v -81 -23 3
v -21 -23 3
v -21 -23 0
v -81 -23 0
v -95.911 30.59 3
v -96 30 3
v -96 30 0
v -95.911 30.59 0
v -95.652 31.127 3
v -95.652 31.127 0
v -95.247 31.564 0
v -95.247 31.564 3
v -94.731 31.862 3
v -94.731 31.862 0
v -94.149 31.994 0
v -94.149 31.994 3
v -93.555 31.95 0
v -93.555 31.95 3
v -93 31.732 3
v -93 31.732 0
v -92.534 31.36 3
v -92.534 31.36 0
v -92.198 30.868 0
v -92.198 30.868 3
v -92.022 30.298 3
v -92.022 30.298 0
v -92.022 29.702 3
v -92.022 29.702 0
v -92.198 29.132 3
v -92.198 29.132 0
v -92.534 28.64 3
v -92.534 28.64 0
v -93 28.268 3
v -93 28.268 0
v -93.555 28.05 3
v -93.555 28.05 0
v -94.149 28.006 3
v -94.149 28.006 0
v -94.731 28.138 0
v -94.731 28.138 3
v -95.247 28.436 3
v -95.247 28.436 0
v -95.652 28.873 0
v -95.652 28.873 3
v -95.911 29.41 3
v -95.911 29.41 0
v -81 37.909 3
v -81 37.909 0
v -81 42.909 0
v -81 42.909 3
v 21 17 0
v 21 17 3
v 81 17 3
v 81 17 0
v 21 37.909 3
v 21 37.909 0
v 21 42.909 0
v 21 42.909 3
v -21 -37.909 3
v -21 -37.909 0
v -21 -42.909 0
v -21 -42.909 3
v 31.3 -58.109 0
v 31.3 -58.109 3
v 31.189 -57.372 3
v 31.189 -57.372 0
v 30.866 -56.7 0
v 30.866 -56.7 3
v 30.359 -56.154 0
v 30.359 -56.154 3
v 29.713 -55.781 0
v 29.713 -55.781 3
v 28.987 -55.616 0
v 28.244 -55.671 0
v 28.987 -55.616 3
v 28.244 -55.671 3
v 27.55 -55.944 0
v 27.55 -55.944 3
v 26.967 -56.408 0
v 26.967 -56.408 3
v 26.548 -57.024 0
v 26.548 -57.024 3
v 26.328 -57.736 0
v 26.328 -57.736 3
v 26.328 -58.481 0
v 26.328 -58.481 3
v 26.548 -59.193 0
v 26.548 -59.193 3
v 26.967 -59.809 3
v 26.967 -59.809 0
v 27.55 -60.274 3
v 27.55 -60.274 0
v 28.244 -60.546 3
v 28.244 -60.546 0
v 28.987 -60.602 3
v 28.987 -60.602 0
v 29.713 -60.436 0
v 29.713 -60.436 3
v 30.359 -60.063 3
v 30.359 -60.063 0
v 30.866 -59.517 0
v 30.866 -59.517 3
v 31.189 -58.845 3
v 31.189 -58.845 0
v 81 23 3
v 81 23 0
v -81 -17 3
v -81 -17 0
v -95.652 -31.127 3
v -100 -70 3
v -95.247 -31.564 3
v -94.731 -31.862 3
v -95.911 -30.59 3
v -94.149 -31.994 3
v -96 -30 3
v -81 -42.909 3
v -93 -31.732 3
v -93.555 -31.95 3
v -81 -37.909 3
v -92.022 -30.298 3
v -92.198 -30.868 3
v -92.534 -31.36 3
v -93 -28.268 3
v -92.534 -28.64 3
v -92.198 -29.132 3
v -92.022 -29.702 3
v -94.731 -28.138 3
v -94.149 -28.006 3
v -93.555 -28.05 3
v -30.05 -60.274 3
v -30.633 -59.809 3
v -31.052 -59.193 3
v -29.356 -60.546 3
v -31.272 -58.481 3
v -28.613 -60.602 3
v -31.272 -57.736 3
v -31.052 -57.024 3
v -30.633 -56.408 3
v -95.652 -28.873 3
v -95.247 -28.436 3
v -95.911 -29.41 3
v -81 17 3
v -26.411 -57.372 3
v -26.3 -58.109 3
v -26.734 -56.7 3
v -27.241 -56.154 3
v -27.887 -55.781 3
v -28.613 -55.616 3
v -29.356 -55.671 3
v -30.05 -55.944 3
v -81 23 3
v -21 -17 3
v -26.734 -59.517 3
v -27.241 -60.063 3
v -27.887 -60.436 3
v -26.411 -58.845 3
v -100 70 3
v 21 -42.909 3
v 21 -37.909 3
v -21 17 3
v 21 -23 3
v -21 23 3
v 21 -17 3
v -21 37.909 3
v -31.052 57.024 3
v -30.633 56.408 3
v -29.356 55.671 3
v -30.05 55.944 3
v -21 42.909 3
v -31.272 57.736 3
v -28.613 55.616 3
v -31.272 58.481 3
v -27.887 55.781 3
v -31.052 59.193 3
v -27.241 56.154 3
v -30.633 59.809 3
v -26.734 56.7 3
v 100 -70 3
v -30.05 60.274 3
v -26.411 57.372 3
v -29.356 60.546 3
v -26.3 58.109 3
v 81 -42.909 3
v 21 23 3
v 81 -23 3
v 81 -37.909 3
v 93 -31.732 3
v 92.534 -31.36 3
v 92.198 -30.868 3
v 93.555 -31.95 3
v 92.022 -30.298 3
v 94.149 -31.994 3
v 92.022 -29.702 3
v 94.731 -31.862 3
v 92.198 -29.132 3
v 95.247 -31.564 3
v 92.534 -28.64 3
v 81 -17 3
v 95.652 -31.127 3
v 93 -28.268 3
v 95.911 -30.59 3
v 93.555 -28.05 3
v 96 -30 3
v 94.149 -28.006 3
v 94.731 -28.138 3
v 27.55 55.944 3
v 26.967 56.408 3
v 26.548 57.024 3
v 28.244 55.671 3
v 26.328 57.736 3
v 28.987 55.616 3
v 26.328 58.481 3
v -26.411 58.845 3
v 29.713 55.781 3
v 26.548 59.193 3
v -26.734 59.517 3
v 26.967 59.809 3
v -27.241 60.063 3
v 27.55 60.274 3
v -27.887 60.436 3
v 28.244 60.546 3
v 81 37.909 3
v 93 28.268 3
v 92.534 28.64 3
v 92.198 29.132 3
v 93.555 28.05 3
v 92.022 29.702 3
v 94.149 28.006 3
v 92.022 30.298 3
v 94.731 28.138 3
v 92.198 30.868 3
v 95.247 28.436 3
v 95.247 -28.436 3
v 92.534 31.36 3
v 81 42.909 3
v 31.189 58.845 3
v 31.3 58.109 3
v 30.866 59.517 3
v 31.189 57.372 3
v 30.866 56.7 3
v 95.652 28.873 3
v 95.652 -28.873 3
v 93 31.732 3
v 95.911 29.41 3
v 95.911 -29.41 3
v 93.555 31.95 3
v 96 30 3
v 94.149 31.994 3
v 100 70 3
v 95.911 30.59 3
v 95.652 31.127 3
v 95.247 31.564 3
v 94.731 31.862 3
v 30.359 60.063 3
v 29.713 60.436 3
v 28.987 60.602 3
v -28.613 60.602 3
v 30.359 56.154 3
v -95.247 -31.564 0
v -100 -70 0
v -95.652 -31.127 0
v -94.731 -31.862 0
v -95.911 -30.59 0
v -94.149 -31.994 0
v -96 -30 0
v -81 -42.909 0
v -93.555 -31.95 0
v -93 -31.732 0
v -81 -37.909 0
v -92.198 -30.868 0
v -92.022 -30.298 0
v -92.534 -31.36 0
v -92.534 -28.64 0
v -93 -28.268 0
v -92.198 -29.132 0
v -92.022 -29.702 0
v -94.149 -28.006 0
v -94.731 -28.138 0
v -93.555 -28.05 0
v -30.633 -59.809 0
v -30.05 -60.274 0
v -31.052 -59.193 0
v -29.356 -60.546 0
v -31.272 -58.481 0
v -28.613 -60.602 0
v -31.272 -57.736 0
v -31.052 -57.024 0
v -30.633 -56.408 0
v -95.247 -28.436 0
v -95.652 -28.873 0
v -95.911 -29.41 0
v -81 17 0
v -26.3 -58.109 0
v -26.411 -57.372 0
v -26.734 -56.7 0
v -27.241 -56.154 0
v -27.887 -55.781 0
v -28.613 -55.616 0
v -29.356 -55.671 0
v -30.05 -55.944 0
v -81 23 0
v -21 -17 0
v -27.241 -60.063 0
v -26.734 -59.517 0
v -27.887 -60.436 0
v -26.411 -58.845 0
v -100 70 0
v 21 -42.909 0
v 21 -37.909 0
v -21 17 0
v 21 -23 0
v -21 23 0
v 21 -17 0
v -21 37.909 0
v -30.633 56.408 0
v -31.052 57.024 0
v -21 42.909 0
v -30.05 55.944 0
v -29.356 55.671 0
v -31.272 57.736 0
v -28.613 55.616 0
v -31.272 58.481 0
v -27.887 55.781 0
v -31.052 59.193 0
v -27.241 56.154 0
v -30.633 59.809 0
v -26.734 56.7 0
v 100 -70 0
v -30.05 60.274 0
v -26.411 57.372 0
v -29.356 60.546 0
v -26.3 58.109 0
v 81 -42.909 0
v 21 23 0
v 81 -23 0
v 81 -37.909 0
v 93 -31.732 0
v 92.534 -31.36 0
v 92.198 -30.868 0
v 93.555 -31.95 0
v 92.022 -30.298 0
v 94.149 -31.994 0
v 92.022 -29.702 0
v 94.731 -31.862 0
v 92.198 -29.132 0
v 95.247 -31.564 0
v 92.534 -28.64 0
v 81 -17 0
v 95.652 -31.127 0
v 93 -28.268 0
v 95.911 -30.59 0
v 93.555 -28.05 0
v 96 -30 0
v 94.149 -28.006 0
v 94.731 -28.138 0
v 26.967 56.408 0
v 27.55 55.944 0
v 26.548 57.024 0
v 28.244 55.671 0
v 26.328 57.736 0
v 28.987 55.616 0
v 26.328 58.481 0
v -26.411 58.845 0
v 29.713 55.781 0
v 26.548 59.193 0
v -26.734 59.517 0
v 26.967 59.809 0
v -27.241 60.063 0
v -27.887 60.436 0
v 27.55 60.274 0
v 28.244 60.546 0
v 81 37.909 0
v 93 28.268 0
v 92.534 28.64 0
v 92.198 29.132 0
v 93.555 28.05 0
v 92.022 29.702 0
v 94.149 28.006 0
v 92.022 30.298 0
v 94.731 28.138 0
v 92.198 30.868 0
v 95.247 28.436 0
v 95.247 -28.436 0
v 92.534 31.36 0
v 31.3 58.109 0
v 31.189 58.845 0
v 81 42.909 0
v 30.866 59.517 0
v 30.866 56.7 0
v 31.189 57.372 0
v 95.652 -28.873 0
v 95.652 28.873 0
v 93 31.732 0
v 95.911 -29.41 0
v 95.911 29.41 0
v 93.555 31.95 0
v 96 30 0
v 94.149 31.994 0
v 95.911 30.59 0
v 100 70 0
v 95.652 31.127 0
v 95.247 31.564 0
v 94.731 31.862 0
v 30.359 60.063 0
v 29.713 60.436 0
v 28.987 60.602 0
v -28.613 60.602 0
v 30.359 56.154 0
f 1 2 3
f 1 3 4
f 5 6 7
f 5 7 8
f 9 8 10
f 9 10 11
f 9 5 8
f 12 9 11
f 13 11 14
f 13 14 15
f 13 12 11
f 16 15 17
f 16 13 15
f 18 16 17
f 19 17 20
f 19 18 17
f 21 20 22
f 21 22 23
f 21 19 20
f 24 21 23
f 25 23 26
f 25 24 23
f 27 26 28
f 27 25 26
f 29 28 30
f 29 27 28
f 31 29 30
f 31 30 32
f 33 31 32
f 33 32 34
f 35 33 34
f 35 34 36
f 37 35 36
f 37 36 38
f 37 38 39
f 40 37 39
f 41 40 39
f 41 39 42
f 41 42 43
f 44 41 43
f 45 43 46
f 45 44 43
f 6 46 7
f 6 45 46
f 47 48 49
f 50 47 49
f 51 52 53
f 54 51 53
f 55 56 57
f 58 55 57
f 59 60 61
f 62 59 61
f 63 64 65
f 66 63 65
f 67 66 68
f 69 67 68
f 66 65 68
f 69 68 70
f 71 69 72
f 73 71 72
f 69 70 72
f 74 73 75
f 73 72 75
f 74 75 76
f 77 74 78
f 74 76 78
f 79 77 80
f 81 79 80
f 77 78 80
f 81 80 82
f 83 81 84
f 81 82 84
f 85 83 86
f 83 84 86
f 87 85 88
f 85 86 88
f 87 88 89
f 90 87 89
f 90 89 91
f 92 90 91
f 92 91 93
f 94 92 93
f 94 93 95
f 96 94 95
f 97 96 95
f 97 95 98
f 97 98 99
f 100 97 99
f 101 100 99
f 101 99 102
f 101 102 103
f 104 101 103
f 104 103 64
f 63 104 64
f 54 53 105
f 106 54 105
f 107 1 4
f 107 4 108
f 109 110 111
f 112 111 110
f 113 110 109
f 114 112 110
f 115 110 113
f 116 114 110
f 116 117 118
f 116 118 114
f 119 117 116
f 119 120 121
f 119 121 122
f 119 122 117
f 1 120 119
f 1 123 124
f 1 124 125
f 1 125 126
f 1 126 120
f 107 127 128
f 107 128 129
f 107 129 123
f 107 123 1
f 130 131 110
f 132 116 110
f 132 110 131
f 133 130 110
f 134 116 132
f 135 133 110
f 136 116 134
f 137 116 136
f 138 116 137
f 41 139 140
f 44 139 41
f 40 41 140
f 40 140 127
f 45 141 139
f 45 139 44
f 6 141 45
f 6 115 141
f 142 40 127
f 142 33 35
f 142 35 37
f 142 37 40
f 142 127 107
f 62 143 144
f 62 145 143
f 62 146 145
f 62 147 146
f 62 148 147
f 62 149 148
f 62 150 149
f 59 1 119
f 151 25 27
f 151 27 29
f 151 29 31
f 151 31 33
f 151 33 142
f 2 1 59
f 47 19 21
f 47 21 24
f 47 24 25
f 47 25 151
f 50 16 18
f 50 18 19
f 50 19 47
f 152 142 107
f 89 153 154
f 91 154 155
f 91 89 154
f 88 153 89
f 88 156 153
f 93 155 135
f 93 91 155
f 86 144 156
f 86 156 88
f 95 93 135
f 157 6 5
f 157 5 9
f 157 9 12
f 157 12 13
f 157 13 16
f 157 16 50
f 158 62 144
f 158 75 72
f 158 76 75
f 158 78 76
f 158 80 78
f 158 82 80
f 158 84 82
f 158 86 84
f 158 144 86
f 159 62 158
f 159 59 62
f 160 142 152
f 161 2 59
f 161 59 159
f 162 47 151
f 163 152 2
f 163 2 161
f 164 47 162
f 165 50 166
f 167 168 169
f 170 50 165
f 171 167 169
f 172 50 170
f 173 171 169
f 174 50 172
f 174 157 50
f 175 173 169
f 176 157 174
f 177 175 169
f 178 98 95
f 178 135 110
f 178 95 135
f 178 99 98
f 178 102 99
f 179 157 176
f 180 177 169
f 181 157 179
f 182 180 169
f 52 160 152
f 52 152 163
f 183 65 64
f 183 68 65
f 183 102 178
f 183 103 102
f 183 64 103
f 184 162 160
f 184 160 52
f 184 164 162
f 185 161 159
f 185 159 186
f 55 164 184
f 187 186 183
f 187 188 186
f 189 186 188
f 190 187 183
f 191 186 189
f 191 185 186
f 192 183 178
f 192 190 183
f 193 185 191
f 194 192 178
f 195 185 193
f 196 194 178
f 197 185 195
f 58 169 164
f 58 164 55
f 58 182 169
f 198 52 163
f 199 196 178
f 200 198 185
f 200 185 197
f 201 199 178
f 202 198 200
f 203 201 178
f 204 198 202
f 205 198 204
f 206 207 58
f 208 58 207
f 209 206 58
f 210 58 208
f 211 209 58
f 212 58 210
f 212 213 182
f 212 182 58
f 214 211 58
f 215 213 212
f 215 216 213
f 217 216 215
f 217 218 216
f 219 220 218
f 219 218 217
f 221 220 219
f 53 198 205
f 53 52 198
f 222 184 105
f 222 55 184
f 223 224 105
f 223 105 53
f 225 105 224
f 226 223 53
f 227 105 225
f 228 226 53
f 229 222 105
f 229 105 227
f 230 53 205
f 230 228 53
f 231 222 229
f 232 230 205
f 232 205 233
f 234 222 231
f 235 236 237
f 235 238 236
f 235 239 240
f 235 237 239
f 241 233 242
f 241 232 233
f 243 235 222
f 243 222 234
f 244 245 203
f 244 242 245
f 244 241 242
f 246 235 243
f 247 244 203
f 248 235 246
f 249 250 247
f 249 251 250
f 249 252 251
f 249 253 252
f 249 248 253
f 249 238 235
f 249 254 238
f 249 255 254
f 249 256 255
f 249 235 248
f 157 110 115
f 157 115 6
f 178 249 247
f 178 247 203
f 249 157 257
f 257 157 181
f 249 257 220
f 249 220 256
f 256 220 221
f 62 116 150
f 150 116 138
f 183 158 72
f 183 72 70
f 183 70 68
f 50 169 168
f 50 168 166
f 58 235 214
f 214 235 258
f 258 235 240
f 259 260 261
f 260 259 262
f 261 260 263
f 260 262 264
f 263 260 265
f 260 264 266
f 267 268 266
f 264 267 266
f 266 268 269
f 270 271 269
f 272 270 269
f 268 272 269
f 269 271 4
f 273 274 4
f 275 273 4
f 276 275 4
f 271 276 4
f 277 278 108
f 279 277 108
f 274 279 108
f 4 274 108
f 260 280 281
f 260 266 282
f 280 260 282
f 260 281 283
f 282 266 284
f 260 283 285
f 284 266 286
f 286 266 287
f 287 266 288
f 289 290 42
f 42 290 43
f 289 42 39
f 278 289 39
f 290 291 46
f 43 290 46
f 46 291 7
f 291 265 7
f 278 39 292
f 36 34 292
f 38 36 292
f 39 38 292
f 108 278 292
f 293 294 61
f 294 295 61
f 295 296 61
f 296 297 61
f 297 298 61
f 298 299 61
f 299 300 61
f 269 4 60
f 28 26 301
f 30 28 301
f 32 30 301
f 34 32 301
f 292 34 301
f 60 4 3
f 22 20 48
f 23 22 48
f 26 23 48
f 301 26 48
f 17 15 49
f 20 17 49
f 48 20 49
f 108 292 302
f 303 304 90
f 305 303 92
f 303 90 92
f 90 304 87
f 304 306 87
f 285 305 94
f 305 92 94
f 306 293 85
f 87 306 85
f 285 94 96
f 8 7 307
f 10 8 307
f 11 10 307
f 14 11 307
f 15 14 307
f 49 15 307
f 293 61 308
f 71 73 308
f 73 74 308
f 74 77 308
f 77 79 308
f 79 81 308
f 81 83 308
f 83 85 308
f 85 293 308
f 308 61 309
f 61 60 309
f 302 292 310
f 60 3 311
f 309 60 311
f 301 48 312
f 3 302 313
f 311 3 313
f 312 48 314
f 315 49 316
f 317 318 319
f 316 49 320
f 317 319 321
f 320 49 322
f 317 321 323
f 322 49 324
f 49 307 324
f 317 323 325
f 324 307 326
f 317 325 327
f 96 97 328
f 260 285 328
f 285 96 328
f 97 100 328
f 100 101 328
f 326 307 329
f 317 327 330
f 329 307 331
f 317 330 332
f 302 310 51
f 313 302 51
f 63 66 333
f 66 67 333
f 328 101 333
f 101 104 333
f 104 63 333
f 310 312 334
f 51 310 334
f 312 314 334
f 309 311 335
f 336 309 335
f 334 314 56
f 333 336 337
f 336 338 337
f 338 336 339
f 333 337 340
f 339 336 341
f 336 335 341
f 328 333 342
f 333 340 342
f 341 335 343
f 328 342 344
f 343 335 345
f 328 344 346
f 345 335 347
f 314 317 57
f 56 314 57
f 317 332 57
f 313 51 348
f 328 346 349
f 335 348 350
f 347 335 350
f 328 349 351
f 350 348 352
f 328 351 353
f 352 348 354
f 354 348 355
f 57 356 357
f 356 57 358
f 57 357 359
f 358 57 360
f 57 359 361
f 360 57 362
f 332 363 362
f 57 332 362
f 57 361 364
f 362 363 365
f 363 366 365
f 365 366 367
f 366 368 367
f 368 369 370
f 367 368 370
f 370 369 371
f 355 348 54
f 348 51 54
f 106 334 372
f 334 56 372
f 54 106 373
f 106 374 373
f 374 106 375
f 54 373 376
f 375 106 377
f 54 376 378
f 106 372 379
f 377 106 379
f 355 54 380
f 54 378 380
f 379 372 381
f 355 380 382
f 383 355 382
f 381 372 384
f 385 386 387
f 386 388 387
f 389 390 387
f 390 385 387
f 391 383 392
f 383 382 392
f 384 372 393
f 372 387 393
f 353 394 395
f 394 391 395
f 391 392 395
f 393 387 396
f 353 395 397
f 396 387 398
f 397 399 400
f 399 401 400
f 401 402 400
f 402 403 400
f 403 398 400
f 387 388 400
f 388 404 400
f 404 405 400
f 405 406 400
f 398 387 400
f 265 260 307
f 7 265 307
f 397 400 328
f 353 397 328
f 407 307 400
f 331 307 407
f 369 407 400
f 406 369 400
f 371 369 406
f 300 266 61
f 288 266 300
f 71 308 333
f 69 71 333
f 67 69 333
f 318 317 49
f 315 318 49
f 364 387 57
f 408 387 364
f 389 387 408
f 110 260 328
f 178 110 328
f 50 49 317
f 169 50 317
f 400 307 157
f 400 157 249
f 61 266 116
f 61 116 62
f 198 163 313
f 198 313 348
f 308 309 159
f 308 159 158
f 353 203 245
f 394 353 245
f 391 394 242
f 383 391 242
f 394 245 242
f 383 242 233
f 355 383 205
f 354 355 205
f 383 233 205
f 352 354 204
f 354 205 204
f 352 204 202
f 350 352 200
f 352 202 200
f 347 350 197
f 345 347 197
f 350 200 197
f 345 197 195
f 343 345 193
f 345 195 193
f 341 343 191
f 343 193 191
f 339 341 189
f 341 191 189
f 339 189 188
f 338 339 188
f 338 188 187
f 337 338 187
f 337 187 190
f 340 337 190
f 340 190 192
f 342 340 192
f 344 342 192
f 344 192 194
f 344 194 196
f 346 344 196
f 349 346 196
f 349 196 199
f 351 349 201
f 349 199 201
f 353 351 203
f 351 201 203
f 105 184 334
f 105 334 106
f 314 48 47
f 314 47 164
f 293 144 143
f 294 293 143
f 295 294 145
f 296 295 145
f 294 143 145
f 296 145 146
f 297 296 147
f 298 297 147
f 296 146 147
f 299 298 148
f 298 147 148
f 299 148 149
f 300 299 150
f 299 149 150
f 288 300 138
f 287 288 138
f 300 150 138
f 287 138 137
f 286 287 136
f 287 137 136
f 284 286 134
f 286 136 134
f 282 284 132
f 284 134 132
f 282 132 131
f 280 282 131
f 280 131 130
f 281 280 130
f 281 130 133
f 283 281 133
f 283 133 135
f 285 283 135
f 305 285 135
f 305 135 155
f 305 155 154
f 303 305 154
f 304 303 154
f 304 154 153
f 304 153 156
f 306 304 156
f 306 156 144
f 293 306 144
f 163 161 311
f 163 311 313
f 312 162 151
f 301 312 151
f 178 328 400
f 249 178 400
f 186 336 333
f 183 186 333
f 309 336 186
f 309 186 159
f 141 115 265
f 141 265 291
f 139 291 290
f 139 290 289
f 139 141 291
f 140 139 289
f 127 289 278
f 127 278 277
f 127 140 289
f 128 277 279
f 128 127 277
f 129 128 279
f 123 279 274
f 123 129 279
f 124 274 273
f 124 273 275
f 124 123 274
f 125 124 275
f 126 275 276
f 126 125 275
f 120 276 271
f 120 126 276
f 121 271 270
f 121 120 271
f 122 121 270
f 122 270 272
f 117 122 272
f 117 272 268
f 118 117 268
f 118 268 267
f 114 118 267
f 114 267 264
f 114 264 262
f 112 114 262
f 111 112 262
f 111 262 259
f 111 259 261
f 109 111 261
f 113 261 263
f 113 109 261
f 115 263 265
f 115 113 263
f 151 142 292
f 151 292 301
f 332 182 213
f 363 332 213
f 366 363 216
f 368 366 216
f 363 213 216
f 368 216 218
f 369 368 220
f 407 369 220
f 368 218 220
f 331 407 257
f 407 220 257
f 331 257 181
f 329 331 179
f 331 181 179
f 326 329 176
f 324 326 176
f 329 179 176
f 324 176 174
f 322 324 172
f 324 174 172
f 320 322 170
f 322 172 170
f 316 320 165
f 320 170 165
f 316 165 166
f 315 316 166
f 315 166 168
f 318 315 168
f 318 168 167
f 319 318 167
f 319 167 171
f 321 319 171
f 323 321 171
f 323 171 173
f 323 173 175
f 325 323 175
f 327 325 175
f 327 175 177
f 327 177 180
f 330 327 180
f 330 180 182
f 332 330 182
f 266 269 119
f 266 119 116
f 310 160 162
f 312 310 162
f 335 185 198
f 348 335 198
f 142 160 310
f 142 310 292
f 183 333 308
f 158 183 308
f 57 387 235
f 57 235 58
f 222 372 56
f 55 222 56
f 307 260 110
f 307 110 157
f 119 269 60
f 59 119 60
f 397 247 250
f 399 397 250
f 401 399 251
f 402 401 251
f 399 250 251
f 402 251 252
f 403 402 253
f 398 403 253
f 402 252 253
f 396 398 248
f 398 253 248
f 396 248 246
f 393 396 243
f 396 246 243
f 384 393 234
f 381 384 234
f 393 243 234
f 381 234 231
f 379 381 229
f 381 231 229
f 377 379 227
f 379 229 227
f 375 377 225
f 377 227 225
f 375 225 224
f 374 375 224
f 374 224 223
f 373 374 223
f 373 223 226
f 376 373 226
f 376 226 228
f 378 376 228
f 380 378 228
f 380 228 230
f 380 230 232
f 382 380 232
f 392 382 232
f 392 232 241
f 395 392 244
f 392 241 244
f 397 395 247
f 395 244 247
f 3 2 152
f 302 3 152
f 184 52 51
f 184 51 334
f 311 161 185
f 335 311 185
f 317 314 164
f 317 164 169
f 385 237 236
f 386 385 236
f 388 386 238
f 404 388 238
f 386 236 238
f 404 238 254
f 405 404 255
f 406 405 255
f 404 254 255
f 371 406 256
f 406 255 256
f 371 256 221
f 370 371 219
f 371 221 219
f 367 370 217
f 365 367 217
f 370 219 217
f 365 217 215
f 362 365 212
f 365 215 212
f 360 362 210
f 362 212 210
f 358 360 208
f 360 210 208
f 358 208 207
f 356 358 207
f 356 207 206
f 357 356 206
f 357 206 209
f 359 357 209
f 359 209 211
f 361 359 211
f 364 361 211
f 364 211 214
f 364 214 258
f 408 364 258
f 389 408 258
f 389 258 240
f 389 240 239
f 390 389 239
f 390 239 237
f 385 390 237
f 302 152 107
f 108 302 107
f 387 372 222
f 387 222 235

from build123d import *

# Parameters (mm, degrees)
SKETCH_2_W               = 200
SKETCH_2_H               = 140
EXTRUDE_1_DEPTH          = 3
SKETCH_3_R               = 2
CUT_EXTRUDE_1_DEPTH      = 3
SKETCH_4_W               = 60
SKETCH_4_H               = 6
CUT_EXTRUDE_2_DEPTH      = 10
SKETCH_5_W               = 60
SKETCH_5_H               = 5
CUT_EXTRUDE_3_DEPTH      = 6
MIRROR_2_COPY_1_SKETCH_W = 60
MIRROR_2_COPY_1_SKETCH_H = 5
MIRROR_2_COPY_1_DEPTH    = 6
SKETCH_6_R               = 2.5
CUT_EXTRUDE_4_DEPTH      = 5


with BuildPart() as part:
    # 草图2 → 凸台-拉伸1 (new body)
    with BuildSketch(Plane.XY):
        Rectangle(SKETCH_2_W, SKETCH_2_H)
    extrude(amount=EXTRUDE_1_DEPTH)

    # 草图3 → 切除-拉伸1 (cut)
    with BuildSketch(Plane.XY.offset(3)):
        with Locations((94, 30)):
            Circle(SKETCH_3_R)
        with Locations((94, -30)):
            Circle(SKETCH_3_R)
    cut_extrude_1 = extrude(amount=-CUT_EXTRUDE_1_DEPTH, mode=Mode.SUBTRACT)

    # 草图4 → 切除-拉伸2 (cut)
    with BuildSketch(Plane.XY.offset(3)):
        with Locations((51, 20)):
            Rectangle(SKETCH_4_W, SKETCH_4_H)
        with Locations((51, -20)):
            Rectangle(SKETCH_4_W, SKETCH_4_H)
    cut_extrude_2 = extrude(amount=-CUT_EXTRUDE_2_DEPTH, mode=Mode.SUBTRACT)

    # 草图5 → 切除-拉伸3 (cut)
    with BuildSketch(Plane(origin=(0, 0, 0), x_dir=(-1, 0, 0), z_dir=(0, 0, -1))):
        with Locations((-51, 40.40876744)):
            Rectangle(SKETCH_5_W, SKETCH_5_H)
    cut_extrude_3 = extrude(amount=-CUT_EXTRUDE_3_DEPTH, mode=Mode.SUBTRACT)

    # 镜向1: 切除-拉伸3 across plane
    add(cut_extrude_3.mirror(Plane.ZX), mode=Mode.SUBTRACT)

    # 镜向2: 切除-拉伸1, 切除-拉伸2, 切除-拉伸3 across plane
    add(cut_extrude_1.mirror(Plane.ZY), mode=Mode.SUBTRACT)
    add(cut_extrude_2.mirror(Plane.ZY), mode=Mode.SUBTRACT)
    add(cut_extrude_3.mirror(Plane.ZY), mode=Mode.SUBTRACT)

    # 镜向2 copy 1 sketch → 镜向2 copy 1 (cut)
    with BuildSketch(Plane(origin=(0, 0, 0), x_dir=(1, 0, 0), z_dir=(0, 0, -1))):
        with Locations((-51, 40.40876744)):
            Rectangle(MIRROR_2_COPY_1_SKETCH_W, MIRROR_2_COPY_1_SKETCH_H)
    extrude(amount=-MIRROR_2_COPY_1_DEPTH, mode=Mode.SUBTRACT)

    # 草图6 → 切除-拉伸4 (cut)
    with BuildSketch(Plane.XY.offset(3)):
        with Locations((-28.8, 58.108563741)):
            Circle(SKETCH_6_R)
        with Locations((-28.8, -58.108563741)):
            Circle(SKETCH_6_R)
        with Locations((28.8, -58.108563741)):
            Circle(SKETCH_6_R)
        with Locations((28.8, 58.108563741)):
            Circle(SKETCH_6_R)
    extrude(amount=-CUT_EXTRUDE_4_DEPTH, mode=Mode.SUBTRACT)


solid = part.part
